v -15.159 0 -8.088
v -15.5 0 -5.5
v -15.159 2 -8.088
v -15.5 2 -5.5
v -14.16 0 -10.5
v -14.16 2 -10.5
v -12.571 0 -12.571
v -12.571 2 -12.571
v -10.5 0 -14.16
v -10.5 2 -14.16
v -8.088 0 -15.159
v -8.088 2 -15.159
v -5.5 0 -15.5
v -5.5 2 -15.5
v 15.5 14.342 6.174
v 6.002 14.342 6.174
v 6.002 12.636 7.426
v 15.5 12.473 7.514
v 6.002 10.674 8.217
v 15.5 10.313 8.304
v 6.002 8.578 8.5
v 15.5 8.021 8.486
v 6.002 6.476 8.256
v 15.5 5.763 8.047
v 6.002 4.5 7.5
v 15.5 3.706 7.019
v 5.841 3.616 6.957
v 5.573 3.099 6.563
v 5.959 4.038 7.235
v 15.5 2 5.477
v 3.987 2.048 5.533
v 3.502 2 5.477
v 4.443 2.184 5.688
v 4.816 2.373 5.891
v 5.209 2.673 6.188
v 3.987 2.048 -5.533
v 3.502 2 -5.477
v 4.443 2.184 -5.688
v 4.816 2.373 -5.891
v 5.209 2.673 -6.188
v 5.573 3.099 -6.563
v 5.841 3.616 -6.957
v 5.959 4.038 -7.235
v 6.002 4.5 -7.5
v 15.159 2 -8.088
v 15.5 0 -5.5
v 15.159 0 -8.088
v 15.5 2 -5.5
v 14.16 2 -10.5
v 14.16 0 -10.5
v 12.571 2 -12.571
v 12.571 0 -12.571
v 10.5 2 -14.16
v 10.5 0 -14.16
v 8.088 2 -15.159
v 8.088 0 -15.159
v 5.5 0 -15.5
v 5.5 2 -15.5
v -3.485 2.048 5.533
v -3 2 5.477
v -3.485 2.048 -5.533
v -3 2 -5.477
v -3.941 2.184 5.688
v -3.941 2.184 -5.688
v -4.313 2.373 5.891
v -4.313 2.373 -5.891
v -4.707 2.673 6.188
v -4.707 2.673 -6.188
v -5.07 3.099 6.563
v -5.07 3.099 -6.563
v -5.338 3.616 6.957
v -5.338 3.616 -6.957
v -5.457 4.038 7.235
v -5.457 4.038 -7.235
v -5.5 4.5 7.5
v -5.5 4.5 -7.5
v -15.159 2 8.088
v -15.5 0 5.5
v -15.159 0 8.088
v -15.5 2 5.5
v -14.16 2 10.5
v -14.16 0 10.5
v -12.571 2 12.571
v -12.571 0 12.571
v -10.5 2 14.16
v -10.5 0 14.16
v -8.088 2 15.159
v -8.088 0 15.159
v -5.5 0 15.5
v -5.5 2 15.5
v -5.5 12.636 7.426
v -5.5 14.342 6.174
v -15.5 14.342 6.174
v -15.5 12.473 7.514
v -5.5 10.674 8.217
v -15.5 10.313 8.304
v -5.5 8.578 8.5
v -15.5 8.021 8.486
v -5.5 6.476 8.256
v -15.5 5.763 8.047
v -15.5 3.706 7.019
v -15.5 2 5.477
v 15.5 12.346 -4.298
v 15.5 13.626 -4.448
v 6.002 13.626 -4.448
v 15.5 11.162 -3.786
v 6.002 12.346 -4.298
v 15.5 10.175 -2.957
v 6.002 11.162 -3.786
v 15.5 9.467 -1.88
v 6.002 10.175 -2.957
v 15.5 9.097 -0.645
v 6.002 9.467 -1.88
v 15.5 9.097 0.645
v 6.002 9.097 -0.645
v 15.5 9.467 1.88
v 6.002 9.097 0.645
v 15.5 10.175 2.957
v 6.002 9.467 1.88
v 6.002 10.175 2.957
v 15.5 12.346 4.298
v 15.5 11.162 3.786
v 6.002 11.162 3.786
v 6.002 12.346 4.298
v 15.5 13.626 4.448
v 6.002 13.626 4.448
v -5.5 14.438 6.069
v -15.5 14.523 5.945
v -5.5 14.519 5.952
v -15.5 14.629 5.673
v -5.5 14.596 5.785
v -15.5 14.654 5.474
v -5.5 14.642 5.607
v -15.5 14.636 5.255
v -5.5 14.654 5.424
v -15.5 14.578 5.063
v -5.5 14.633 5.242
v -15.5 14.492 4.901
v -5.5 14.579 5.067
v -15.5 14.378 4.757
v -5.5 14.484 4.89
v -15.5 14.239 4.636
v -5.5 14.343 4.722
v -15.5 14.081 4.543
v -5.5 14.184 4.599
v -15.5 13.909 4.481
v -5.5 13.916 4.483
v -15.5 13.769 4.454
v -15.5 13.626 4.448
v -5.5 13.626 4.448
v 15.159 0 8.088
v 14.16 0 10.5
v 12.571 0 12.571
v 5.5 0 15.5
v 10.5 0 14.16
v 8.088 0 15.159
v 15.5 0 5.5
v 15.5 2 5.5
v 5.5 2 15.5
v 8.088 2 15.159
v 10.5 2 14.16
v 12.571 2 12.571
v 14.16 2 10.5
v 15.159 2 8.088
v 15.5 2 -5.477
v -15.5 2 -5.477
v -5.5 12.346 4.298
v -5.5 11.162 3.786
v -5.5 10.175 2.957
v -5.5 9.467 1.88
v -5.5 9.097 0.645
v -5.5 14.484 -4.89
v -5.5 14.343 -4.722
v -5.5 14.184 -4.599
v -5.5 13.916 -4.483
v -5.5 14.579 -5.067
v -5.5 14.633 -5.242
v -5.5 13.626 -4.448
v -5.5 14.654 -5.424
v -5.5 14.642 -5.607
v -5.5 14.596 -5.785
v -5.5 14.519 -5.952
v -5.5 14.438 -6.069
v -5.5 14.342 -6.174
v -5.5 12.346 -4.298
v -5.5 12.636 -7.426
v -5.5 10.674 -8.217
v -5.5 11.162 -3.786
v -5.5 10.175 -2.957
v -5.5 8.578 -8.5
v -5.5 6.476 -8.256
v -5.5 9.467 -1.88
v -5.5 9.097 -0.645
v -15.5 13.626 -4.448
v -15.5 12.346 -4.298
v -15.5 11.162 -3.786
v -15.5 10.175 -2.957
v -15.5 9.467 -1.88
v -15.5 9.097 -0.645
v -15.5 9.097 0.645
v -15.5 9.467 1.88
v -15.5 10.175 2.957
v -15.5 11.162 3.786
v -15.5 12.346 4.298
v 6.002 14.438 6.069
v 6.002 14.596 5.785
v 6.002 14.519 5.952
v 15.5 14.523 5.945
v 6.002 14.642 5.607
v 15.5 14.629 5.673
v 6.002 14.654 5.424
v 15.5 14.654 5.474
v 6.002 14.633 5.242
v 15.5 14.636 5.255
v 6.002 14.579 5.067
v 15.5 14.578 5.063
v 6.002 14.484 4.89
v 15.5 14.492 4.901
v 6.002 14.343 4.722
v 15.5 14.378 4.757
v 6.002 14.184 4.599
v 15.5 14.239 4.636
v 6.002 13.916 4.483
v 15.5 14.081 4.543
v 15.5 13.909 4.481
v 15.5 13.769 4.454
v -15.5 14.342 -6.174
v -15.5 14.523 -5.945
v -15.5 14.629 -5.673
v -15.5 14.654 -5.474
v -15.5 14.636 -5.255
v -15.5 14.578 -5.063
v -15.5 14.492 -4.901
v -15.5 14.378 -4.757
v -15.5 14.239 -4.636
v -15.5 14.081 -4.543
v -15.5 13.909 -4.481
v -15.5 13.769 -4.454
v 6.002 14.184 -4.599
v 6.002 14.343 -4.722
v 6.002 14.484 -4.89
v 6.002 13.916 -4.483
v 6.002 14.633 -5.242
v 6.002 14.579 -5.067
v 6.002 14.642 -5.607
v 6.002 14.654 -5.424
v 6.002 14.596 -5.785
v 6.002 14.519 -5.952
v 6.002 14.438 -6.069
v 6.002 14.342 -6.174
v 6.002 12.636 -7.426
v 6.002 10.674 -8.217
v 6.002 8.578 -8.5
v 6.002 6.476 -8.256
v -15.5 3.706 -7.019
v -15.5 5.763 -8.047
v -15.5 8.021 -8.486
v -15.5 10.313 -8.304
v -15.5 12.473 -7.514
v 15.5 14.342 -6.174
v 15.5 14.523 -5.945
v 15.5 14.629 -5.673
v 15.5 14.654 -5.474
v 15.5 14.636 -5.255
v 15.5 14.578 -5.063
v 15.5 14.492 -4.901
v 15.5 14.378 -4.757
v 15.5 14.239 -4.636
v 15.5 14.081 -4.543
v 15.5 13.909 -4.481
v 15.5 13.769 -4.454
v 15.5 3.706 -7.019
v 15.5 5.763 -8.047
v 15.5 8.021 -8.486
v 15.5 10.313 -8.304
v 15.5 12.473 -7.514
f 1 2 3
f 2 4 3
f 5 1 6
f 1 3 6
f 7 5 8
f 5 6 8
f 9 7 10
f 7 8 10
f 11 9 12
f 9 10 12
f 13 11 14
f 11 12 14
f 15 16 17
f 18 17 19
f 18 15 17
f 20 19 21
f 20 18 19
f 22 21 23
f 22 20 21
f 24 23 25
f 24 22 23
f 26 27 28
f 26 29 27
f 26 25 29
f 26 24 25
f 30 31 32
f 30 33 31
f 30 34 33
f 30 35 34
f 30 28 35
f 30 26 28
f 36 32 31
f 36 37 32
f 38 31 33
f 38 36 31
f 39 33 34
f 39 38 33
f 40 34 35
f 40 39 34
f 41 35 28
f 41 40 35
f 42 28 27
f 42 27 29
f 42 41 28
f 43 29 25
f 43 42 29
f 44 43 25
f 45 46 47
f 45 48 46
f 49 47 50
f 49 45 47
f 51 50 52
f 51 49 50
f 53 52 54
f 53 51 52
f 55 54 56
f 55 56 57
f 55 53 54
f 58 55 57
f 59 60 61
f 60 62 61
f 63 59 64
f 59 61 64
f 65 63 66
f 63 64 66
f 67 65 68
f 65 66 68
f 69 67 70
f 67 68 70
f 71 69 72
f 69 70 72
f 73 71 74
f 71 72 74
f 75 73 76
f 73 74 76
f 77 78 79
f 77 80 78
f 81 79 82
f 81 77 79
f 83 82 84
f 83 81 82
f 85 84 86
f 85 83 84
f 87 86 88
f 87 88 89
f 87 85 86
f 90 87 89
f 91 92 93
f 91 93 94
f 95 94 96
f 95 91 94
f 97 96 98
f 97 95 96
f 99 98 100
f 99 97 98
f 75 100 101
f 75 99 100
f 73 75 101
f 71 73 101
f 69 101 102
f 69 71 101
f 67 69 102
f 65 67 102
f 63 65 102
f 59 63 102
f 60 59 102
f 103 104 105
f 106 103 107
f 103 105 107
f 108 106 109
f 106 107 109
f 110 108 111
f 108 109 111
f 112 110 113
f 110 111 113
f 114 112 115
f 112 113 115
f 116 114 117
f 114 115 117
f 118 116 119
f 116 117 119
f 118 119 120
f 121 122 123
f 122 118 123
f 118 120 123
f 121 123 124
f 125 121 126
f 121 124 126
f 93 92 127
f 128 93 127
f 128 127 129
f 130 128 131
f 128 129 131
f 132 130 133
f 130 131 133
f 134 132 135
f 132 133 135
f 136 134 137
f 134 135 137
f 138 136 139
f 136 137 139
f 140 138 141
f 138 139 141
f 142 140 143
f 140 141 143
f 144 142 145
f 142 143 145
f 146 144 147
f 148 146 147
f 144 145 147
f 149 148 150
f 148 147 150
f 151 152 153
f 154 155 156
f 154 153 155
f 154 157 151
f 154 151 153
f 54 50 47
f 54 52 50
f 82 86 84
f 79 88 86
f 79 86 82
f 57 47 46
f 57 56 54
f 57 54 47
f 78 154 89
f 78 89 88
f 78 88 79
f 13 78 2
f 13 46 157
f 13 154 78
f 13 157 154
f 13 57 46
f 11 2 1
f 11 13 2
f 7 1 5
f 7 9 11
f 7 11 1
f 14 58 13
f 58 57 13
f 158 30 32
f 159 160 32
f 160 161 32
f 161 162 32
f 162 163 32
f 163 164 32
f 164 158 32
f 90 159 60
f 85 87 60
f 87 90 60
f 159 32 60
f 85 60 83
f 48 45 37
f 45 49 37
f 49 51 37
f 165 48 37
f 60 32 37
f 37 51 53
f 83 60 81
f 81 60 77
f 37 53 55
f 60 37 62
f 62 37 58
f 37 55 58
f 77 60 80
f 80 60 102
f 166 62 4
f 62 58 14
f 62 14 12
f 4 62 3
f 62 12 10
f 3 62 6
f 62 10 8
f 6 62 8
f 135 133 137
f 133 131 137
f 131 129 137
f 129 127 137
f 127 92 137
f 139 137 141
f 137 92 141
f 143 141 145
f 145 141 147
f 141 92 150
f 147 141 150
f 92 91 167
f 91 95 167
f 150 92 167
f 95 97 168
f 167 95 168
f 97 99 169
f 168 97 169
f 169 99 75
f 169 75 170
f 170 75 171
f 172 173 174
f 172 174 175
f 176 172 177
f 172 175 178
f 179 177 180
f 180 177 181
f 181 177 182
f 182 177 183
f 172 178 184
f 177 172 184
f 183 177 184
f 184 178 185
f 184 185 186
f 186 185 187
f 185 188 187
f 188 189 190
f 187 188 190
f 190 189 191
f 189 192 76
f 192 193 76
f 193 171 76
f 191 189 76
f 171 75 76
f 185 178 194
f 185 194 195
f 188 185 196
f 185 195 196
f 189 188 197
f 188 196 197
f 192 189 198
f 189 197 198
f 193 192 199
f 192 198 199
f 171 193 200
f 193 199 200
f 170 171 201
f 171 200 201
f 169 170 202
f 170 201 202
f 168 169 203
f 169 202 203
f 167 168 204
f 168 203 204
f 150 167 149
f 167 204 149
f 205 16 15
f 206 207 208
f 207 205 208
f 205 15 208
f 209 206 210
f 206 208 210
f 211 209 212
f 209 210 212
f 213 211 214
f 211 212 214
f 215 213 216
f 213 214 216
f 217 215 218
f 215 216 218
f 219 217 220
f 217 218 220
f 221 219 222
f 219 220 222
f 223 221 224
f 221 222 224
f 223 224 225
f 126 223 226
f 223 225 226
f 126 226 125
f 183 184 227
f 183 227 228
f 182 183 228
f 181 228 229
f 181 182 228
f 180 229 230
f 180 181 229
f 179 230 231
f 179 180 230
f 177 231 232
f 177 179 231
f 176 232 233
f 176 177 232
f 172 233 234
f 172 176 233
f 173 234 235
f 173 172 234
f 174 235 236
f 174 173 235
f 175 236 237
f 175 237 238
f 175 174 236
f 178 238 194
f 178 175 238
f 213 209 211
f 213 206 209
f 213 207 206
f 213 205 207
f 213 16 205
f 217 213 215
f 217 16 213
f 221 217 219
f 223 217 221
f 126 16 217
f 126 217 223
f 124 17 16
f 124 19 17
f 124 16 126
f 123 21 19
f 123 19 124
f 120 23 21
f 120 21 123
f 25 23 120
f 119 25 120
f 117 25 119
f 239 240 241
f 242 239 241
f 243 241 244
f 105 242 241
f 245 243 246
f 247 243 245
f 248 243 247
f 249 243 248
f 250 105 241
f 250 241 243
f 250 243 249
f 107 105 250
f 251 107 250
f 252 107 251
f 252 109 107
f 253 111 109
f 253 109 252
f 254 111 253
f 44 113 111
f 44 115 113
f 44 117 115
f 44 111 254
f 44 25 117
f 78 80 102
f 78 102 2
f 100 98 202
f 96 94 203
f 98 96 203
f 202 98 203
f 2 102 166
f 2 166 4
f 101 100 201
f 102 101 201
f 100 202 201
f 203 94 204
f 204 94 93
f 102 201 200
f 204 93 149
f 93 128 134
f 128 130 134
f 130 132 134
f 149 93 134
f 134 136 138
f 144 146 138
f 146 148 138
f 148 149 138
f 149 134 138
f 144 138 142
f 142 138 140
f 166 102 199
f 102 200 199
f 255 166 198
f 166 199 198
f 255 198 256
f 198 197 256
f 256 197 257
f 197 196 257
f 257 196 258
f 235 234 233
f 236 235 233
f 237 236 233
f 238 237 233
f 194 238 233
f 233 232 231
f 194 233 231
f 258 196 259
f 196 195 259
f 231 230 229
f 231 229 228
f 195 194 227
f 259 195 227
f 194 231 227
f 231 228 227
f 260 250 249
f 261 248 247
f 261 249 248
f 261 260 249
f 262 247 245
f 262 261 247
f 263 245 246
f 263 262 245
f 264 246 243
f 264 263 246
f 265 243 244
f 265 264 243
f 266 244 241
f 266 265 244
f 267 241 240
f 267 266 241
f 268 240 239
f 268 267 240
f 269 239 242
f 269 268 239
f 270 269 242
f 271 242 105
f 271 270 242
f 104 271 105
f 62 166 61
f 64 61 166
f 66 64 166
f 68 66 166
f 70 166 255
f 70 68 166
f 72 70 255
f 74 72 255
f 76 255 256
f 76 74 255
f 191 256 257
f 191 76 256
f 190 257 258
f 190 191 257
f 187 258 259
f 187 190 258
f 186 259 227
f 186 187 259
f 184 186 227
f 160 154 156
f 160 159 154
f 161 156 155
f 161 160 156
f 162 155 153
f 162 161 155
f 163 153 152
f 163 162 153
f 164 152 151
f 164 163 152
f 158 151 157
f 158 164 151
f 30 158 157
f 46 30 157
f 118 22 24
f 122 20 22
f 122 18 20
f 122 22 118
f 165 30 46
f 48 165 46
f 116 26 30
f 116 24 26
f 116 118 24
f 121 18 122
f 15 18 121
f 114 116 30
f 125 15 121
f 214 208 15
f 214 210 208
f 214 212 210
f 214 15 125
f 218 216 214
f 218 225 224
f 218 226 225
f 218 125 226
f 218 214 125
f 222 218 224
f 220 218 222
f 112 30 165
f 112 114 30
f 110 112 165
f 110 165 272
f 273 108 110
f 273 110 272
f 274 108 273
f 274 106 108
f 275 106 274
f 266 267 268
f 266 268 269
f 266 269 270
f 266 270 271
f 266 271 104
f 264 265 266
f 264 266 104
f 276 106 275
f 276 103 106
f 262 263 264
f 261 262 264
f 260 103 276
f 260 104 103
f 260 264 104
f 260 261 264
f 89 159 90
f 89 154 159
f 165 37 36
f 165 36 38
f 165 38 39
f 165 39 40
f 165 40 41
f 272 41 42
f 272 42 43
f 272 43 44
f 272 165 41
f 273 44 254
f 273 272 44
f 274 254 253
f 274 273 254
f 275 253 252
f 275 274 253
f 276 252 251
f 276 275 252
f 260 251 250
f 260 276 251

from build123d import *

# Parameters (mm, degrees)
BOSS_EXTRUDE1_DEPTH = 2
SKETCH2_R           = 8.5
BOSS_EXTRUDE3_DEPTH = 31
SKETCH3_R           = 4.45
CUT_EXTRUDE1_DEPTH  = 33
FILLET1_R           = 1
SKETCH4_W           = 11.502222151
SKETCH4_H           = 31
CUT_EXTRUDE2_DEPTH  = 20
FILLET2_R           = 10
FILLET3_R           = 2.5


with BuildPart() as part:
    # Sketch1 → Boss-Extrude1 (new body)
    with BuildSketch(Plane(origin=(0, 0, 0), x_dir=(1, 0, 0), z_dir=(0, 1, 0))):
        Polygon((0, 15.5), (15.5, 15.5), (15.5, -15.5), (-15.5, -15.5), (-15.5, 15.5), align=None)
    extrude(amount=BOSS_EXTRUDE1_DEPTH)

    # Sketch2 → Boss-Extrude3 (add)
    with BuildSketch(Plane(origin=(15.5, 0, 0), x_dir=(0, 0, -1), z_dir=(1, 0, 0))):
        with Locations((0, 8.5)):
            Circle(SKETCH2_R)
    extrude(amount=-BOSS_EXTRUDE3_DEPTH)

    # Sketch3 → Cut-Extrude1 (cut)
    with BuildSketch(Plane.ZY.offset(15.5)):
        with Locations((0, 13.5)):
            Circle(SKETCH3_R)
    extrude(amount=-CUT_EXTRUDE1_DEPTH, mode=Mode.SUBTRACT)

    # Fillet1
    fillet1_edges = [part.edges().sort_by_distance(p)[0] for p in [
        (0, 16.24475, -3.502691456),
        (0, 16.24475, 3.502691456),
    ]]
    fillet(fillet1_edges, radius=FILLET1_R)

    # Sketch4 → Cut-Extrude2 (cut)
    with BuildSketch(Plane(origin=(0, 2, 0), x_dir=(1, 0, 0), z_dir=(0, 1, 0))):
        with Locations((0.251111076, 0)):
            Rectangle(SKETCH4_W, SKETCH4_H)
    extrude(amount=CUT_EXTRUDE2_DEPTH, mode=Mode.SUBTRACT)

    # Fillet2
    fillet2_edges = [part.edges().sort_by_distance(p)[0] for p in [
        (15.5, 1, -15.5),
        (15.5, 1, 15.5),
        (-15.5, 1, 15.5),
        (-15.5, 1, -15.5),
    ]]
    fillet(fillet2_edges, radius=FILLET2_R)

    # Fillet3
    fillet3_edges = [part.edges().sort_by_distance(p)[0] for p in [
        (-5.5, 2, 0),
        (6.002222151, 2, 0),
    ]]
    fillet(fillet3_edges, radius=FILLET3_R)


solid = part.part
